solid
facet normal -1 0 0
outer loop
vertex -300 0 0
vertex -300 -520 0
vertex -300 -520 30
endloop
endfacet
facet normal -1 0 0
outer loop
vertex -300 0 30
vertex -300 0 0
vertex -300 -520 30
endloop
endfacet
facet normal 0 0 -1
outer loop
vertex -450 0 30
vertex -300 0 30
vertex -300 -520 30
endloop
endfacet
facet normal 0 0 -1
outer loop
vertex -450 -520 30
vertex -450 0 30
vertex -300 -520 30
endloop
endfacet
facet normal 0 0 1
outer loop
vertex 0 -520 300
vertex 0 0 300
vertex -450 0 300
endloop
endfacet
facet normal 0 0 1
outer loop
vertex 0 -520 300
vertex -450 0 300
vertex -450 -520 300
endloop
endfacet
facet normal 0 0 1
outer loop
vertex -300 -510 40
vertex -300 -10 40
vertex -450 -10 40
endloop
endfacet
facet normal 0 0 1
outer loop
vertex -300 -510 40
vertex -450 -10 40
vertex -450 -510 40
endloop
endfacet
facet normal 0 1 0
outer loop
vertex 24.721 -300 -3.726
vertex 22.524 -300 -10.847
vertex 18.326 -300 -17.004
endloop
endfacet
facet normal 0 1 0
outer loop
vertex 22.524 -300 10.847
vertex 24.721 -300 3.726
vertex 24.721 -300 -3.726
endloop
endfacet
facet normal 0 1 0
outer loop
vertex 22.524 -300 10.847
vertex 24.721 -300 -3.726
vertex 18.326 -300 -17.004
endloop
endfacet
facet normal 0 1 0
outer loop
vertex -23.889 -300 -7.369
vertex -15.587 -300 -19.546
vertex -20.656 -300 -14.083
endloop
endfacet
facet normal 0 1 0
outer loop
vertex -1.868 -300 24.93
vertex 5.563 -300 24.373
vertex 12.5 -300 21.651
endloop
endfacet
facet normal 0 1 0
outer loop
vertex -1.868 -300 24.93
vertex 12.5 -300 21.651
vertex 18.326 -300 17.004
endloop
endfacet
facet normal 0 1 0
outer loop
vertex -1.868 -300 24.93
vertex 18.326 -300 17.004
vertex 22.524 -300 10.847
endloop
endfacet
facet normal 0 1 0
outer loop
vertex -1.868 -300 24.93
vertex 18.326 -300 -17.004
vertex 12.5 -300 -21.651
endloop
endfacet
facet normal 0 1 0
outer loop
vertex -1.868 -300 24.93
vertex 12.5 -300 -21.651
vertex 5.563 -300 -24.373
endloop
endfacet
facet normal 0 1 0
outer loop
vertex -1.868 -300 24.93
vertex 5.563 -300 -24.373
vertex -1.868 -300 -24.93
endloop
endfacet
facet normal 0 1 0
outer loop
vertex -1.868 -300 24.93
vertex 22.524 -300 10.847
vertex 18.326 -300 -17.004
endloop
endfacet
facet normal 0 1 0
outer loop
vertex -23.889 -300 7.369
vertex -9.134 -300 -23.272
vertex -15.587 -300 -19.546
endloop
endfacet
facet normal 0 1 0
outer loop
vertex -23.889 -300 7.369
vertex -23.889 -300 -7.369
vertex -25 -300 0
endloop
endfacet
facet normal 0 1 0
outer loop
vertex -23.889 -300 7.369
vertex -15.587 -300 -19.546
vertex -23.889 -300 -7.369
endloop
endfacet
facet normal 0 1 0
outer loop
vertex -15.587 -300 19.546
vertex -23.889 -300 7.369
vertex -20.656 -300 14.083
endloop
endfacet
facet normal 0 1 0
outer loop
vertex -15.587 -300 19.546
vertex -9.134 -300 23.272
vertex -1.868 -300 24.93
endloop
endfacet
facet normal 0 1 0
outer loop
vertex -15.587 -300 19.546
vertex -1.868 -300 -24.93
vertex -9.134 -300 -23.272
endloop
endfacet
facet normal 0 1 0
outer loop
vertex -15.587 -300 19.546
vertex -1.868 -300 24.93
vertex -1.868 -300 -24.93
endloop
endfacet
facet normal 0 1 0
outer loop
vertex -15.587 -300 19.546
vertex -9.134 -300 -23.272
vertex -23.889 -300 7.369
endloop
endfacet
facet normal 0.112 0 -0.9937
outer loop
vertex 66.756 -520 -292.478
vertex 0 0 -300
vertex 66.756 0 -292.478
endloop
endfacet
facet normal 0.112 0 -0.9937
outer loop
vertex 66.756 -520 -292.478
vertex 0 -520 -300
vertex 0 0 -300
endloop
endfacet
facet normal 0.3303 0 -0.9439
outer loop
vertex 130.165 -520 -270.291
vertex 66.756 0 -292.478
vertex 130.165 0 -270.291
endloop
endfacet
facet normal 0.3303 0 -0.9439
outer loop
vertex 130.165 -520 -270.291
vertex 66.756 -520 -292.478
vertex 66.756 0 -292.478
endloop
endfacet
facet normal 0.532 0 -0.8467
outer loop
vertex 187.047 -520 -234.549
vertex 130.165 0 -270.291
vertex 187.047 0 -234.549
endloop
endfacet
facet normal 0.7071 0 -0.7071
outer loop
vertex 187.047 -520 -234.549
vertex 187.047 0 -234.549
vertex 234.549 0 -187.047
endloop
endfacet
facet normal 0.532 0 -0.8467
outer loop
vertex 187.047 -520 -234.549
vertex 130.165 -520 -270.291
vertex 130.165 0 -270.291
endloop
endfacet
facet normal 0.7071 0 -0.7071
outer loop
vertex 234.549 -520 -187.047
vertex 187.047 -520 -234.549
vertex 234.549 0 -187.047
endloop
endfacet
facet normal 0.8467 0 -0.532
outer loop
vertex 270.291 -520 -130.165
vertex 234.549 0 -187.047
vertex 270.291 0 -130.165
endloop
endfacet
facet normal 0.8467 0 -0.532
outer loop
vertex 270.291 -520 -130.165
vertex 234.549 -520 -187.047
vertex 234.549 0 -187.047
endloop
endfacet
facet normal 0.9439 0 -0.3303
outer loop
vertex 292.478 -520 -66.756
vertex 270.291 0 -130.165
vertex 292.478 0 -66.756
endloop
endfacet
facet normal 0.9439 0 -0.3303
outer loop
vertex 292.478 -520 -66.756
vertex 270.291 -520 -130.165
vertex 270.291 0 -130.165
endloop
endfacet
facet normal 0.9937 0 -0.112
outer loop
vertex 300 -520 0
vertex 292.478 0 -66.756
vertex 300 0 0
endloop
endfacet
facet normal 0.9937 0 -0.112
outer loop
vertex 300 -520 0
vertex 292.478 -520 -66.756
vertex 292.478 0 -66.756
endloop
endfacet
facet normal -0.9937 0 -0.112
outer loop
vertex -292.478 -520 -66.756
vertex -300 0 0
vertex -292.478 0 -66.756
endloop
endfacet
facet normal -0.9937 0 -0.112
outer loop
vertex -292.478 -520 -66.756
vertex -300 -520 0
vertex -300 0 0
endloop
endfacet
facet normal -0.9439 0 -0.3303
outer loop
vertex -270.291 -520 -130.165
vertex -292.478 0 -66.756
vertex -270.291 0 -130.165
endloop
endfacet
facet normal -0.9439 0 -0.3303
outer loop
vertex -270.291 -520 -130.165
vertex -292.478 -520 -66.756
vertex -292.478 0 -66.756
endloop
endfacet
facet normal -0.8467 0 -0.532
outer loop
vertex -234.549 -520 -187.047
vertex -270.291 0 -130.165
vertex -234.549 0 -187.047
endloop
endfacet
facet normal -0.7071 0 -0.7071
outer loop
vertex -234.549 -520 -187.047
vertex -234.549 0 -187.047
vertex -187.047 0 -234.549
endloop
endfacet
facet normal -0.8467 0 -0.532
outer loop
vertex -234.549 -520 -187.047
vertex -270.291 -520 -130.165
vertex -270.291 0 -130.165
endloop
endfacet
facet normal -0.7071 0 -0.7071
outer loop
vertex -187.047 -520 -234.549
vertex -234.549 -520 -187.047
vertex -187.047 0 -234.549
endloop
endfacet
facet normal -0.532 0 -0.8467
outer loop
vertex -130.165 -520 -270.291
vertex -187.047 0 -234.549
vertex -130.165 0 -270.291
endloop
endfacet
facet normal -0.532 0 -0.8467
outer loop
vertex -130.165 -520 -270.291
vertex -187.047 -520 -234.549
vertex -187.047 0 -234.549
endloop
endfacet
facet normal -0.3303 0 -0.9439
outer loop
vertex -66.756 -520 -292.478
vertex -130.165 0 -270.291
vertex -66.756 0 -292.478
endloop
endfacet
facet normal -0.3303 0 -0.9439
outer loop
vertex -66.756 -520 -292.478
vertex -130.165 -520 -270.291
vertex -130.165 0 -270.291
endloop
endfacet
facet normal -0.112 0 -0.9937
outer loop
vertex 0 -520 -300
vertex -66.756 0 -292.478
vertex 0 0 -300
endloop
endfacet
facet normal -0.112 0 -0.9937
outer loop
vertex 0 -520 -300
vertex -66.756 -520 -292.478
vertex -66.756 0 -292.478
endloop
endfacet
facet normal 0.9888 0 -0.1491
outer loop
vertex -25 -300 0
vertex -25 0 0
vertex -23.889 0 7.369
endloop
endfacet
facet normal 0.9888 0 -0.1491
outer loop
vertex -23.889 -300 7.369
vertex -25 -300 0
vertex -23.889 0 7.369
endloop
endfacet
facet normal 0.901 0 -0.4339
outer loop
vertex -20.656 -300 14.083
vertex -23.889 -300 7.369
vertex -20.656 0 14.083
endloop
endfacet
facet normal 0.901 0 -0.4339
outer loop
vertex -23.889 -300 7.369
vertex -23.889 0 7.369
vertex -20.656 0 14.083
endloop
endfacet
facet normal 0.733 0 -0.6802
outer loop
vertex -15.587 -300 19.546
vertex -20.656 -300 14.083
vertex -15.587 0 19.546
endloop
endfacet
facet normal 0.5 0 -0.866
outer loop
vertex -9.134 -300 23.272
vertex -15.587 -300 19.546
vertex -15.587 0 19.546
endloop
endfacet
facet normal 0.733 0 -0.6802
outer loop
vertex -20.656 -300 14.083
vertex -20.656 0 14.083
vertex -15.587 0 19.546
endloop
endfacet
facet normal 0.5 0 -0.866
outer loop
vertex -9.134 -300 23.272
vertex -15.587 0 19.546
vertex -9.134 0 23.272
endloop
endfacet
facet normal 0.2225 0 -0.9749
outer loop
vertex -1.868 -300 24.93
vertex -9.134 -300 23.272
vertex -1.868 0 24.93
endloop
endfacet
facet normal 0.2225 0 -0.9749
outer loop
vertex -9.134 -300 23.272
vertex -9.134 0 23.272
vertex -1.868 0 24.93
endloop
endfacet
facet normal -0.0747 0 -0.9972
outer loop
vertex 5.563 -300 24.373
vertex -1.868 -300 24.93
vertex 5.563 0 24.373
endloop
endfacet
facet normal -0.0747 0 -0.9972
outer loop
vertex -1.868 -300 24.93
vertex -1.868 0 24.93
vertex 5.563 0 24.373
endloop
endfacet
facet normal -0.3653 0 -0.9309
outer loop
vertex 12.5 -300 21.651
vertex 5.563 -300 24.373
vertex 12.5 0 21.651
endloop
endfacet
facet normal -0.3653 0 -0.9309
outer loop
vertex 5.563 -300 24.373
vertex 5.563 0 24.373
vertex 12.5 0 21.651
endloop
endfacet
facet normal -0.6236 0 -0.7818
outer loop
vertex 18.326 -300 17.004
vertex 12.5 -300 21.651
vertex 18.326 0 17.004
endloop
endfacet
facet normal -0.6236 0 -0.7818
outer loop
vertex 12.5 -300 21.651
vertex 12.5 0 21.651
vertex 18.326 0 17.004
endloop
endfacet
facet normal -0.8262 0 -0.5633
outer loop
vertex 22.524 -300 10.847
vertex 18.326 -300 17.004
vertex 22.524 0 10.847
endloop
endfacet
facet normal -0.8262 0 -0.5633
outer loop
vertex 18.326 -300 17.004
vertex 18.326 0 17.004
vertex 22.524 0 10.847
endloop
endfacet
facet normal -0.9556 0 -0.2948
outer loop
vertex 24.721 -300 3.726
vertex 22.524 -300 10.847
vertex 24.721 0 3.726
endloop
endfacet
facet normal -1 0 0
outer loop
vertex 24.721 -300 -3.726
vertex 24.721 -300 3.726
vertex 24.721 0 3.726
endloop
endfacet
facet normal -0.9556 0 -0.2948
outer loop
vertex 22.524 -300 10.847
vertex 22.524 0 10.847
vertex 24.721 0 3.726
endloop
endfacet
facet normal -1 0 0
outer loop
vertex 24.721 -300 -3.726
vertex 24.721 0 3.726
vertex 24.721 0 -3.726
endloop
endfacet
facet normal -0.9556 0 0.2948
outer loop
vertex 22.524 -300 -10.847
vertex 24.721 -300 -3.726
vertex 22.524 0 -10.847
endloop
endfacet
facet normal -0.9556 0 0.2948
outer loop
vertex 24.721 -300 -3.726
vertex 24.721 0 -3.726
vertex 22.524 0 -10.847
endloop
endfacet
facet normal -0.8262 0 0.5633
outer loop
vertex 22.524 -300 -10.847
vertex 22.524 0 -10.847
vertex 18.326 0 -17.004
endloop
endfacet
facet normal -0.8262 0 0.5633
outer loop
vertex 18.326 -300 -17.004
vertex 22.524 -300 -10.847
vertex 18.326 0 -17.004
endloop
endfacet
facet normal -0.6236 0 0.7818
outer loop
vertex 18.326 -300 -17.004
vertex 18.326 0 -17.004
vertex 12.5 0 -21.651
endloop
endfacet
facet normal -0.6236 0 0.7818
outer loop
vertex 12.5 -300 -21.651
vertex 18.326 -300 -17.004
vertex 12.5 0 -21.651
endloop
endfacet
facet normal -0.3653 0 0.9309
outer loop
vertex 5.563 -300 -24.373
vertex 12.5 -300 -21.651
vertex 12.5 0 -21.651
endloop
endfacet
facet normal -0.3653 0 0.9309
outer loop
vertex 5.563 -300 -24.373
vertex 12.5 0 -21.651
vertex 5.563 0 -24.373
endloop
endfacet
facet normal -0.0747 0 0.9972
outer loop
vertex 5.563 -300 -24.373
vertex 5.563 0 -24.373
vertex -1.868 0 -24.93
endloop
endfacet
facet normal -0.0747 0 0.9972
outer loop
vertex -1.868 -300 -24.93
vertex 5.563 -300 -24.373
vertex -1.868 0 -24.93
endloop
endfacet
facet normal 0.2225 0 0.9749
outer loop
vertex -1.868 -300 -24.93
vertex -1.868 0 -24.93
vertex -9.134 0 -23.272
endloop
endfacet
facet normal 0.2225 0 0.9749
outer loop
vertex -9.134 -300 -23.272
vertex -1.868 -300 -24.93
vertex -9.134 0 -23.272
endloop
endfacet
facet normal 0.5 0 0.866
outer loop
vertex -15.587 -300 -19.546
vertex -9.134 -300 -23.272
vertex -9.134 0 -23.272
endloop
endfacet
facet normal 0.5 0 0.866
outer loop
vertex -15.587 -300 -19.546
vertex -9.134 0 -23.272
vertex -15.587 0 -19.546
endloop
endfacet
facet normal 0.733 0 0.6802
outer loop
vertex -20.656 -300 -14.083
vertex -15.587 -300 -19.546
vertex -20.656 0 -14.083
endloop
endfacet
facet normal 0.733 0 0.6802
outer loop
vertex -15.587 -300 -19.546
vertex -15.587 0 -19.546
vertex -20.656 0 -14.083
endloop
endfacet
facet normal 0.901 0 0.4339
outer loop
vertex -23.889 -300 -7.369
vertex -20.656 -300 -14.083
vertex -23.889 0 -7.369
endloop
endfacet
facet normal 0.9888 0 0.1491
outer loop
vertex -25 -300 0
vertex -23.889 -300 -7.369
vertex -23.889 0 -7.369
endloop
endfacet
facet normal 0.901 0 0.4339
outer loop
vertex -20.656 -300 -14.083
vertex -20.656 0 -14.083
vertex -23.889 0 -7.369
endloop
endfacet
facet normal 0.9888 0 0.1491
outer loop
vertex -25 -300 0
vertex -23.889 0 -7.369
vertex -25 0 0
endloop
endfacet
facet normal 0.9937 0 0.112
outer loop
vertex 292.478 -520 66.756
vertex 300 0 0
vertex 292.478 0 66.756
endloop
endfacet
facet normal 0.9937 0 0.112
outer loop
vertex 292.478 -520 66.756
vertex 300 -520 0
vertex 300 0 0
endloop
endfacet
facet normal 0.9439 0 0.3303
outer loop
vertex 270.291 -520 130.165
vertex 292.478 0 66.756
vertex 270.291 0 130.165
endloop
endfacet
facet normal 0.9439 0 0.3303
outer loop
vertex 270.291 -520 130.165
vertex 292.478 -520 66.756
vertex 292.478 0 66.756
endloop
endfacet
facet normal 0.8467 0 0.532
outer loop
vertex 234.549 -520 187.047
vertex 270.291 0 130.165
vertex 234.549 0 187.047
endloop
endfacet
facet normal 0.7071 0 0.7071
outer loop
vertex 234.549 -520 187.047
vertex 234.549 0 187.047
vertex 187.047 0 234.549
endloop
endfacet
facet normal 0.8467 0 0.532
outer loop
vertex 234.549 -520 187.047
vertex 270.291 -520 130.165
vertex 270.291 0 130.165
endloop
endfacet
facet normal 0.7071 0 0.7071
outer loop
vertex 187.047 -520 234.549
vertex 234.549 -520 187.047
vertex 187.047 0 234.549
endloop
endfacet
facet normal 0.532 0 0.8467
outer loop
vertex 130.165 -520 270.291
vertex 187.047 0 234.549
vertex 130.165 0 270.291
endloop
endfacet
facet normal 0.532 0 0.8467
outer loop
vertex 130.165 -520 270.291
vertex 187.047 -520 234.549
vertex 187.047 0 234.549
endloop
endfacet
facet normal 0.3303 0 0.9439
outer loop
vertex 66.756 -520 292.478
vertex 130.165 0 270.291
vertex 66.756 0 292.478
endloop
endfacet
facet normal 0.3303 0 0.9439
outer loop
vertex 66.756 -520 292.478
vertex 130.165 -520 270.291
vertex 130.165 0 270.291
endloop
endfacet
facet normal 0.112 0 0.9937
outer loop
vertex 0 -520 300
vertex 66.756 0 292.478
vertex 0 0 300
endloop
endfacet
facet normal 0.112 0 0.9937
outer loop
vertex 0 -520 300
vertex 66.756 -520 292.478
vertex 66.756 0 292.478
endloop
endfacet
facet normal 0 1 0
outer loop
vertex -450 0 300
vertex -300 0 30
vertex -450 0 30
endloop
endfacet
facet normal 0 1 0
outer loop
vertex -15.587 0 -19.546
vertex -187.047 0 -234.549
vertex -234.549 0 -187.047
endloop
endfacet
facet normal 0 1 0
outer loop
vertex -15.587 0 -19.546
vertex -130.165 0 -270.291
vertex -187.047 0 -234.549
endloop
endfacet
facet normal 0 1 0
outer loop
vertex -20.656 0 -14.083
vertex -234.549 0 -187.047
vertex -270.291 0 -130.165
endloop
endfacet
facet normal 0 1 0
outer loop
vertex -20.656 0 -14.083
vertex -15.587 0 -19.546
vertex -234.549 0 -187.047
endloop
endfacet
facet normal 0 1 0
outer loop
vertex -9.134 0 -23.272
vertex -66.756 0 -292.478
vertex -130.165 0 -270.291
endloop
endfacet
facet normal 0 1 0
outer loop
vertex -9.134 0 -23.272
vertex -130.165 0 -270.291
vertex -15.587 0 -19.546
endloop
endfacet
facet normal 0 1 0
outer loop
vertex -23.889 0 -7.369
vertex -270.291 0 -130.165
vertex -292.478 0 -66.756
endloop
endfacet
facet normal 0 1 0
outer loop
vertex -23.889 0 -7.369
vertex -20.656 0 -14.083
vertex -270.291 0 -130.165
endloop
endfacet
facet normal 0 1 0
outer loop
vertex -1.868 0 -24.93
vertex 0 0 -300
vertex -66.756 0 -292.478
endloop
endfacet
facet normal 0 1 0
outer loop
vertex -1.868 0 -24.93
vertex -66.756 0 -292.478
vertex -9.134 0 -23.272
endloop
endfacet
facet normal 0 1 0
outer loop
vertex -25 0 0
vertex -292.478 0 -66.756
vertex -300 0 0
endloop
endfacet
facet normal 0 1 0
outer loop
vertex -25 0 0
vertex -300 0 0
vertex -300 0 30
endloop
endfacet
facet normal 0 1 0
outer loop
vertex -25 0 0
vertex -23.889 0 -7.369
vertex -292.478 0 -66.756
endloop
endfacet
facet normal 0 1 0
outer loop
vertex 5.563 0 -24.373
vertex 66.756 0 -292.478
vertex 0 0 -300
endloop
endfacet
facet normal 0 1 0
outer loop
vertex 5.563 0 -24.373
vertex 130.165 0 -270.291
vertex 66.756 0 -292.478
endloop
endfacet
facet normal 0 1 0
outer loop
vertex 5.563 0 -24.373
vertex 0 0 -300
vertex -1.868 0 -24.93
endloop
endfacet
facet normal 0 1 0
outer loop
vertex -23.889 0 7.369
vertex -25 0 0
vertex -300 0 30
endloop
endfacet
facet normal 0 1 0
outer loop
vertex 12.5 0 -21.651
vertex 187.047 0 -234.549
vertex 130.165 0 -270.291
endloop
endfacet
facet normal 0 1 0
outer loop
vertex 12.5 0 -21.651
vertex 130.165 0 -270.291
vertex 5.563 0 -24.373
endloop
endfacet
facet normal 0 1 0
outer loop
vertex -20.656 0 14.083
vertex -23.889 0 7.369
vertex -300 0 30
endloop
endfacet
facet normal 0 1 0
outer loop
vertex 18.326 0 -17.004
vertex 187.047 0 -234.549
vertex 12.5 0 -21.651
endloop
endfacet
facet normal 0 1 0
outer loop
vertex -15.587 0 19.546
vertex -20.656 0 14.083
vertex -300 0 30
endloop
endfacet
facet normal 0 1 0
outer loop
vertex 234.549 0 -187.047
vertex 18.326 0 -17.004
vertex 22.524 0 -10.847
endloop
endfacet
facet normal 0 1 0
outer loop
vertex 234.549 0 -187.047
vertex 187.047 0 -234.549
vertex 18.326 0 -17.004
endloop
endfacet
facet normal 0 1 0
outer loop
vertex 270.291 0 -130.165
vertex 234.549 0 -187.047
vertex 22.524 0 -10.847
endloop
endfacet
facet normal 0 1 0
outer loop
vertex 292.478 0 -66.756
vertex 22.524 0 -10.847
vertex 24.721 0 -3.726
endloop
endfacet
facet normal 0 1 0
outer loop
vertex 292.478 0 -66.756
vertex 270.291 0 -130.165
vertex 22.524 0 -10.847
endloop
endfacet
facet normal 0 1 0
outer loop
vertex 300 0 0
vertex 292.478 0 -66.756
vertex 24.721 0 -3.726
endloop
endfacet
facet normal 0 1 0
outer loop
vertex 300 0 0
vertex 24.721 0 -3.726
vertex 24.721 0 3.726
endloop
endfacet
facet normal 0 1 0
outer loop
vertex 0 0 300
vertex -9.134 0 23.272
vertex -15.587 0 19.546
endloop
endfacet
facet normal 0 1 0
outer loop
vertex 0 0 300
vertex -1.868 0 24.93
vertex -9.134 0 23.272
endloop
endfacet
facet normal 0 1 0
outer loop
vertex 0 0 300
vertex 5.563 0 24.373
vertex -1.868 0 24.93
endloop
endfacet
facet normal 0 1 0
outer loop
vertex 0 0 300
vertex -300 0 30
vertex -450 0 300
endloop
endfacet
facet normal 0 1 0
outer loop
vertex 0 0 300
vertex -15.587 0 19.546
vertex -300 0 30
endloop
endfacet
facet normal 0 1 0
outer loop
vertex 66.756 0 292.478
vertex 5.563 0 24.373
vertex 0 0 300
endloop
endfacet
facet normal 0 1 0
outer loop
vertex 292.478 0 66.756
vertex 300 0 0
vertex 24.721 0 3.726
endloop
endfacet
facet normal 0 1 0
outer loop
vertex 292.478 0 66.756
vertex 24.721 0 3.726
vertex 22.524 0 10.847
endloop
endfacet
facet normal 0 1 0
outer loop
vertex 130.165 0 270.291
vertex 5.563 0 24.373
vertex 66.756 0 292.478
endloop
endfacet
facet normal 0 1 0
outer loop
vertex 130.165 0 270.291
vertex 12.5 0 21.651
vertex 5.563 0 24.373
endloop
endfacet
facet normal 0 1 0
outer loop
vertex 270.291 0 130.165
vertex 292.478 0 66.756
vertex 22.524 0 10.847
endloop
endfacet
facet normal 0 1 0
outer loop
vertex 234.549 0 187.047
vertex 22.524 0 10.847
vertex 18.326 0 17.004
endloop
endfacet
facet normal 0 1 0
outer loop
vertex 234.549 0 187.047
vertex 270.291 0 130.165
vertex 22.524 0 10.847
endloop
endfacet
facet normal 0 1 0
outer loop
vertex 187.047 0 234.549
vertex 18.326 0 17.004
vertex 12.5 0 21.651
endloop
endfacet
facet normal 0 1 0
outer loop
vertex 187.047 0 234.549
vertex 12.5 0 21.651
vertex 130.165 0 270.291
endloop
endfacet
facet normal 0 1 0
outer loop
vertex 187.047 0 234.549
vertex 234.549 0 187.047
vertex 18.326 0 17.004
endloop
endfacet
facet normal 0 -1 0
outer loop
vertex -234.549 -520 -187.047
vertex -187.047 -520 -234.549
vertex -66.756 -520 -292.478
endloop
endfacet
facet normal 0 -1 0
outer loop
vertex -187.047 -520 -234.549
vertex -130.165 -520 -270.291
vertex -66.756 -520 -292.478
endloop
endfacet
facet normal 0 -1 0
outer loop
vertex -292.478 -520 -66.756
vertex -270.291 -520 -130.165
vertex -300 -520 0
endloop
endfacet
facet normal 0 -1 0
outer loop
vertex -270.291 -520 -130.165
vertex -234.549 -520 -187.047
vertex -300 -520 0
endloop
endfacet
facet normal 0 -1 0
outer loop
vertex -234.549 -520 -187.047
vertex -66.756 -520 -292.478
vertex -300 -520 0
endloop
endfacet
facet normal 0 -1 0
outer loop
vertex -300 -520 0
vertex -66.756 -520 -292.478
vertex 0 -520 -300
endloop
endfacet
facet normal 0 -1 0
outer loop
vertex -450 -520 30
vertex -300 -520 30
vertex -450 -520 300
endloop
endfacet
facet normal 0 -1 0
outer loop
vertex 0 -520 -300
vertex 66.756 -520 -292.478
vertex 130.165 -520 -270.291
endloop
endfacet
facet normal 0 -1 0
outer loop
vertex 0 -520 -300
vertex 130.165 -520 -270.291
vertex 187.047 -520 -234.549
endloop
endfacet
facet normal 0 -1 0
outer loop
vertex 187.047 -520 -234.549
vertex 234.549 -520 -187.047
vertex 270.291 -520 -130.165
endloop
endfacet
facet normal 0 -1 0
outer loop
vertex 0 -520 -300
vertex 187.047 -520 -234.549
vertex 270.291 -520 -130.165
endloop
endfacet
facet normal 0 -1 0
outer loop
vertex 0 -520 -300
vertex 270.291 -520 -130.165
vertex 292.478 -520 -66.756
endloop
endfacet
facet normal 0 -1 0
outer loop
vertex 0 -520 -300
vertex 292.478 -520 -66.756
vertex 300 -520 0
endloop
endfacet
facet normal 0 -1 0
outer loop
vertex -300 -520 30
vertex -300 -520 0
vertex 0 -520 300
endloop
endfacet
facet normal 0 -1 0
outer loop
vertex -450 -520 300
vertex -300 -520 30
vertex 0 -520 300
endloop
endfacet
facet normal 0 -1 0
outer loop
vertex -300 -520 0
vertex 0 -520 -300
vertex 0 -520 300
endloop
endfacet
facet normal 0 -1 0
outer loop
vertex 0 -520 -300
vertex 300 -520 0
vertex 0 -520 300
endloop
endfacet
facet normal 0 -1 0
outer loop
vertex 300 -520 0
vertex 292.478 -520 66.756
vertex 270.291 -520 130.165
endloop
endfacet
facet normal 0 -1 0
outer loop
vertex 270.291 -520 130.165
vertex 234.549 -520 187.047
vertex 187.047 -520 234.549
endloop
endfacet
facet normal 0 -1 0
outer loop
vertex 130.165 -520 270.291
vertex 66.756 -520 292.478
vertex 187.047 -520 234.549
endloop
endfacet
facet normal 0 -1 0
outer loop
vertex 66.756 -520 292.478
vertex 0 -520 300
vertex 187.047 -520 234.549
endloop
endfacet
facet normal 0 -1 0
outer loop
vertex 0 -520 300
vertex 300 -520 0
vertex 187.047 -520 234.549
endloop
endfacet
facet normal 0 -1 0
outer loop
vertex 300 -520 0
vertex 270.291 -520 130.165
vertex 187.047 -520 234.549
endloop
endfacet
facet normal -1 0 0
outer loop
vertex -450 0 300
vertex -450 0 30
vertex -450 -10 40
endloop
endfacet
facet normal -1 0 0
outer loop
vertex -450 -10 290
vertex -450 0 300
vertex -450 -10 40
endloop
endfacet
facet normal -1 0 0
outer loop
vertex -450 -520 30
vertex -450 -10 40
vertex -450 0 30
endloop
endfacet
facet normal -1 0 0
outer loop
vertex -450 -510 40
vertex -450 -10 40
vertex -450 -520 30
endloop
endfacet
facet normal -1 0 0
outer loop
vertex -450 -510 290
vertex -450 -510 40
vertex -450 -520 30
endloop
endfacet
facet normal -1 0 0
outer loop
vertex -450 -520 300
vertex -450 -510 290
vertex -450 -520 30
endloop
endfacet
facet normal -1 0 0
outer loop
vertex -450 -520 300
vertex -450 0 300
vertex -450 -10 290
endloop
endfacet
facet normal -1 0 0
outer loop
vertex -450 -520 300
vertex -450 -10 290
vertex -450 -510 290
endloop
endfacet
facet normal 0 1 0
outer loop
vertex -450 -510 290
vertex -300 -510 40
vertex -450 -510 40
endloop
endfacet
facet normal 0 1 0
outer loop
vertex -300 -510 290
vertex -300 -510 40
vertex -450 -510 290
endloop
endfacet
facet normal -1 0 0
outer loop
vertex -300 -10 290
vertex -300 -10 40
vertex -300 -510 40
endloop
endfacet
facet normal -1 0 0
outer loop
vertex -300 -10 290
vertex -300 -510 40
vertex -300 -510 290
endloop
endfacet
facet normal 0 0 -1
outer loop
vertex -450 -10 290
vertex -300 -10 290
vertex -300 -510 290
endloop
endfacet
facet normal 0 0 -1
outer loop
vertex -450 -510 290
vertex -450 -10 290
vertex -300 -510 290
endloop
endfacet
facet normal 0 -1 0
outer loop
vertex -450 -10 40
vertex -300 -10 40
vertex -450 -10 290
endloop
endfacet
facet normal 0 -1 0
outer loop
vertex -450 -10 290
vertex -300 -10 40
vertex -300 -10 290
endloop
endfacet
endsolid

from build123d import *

# Parameters (mm, degrees)
F0_W     = 600
F0_H     = 600
F1_DEPTH = 520
F2_R     = 299.99999
F3_W     = 520
F3_H     = 270
F3_W_2   = 500
F3_H_2   = 250
F4_DEPTH = 150
F5_R     = 25
F6_DEPTH = 300


# Not quite as in the source:
# - a fillet or chamfer is up to 0.001 mm smaller than in the source, because OpenCascade refuses the exact size


with BuildPart() as f1:
    # F0 (on Front) → F1 (new body)
    with BuildSketch(Plane.XZ):
        Rectangle(F0_W, F0_H)
    extrude(amount=F1_DEPTH)

    # F2 (radius 300 in the source; OpenCascade refuses exactly that, so slightly less here)
    f2_edges = [f1.edges().sort_by_distance(p)[0] for p in [
        (300, -260, 300),
        (300, -260, -300),
        (-300, -260, -300),
    ]]
    fillet(f2_edges, radius=F2_R)

    # F3 (on face) → F4 (join)
    with BuildSketch(Plane(origin=(-300, 0, 0), x_dir=(0, -1, 0), z_dir=(-1, 0, 0))):
        with Locations((260, 165)):
            Rectangle(F3_W, F3_H)
        with Locations((260, 165)):
            Rectangle(F3_W_2, F3_H_2, mode=Mode.SUBTRACT)
    extrude(amount=F4_DEPTH)

    # F5 (on face) → F6 (cut)
    with BuildSketch(Plane(origin=(0, 0, 0), x_dir=(-1, 0, 0), z_dir=(0, 1, 0))):
        Circle(F5_R)
    extrude(amount=-F6_DEPTH, mode=Mode.SUBTRACT)


solid = f1.part
